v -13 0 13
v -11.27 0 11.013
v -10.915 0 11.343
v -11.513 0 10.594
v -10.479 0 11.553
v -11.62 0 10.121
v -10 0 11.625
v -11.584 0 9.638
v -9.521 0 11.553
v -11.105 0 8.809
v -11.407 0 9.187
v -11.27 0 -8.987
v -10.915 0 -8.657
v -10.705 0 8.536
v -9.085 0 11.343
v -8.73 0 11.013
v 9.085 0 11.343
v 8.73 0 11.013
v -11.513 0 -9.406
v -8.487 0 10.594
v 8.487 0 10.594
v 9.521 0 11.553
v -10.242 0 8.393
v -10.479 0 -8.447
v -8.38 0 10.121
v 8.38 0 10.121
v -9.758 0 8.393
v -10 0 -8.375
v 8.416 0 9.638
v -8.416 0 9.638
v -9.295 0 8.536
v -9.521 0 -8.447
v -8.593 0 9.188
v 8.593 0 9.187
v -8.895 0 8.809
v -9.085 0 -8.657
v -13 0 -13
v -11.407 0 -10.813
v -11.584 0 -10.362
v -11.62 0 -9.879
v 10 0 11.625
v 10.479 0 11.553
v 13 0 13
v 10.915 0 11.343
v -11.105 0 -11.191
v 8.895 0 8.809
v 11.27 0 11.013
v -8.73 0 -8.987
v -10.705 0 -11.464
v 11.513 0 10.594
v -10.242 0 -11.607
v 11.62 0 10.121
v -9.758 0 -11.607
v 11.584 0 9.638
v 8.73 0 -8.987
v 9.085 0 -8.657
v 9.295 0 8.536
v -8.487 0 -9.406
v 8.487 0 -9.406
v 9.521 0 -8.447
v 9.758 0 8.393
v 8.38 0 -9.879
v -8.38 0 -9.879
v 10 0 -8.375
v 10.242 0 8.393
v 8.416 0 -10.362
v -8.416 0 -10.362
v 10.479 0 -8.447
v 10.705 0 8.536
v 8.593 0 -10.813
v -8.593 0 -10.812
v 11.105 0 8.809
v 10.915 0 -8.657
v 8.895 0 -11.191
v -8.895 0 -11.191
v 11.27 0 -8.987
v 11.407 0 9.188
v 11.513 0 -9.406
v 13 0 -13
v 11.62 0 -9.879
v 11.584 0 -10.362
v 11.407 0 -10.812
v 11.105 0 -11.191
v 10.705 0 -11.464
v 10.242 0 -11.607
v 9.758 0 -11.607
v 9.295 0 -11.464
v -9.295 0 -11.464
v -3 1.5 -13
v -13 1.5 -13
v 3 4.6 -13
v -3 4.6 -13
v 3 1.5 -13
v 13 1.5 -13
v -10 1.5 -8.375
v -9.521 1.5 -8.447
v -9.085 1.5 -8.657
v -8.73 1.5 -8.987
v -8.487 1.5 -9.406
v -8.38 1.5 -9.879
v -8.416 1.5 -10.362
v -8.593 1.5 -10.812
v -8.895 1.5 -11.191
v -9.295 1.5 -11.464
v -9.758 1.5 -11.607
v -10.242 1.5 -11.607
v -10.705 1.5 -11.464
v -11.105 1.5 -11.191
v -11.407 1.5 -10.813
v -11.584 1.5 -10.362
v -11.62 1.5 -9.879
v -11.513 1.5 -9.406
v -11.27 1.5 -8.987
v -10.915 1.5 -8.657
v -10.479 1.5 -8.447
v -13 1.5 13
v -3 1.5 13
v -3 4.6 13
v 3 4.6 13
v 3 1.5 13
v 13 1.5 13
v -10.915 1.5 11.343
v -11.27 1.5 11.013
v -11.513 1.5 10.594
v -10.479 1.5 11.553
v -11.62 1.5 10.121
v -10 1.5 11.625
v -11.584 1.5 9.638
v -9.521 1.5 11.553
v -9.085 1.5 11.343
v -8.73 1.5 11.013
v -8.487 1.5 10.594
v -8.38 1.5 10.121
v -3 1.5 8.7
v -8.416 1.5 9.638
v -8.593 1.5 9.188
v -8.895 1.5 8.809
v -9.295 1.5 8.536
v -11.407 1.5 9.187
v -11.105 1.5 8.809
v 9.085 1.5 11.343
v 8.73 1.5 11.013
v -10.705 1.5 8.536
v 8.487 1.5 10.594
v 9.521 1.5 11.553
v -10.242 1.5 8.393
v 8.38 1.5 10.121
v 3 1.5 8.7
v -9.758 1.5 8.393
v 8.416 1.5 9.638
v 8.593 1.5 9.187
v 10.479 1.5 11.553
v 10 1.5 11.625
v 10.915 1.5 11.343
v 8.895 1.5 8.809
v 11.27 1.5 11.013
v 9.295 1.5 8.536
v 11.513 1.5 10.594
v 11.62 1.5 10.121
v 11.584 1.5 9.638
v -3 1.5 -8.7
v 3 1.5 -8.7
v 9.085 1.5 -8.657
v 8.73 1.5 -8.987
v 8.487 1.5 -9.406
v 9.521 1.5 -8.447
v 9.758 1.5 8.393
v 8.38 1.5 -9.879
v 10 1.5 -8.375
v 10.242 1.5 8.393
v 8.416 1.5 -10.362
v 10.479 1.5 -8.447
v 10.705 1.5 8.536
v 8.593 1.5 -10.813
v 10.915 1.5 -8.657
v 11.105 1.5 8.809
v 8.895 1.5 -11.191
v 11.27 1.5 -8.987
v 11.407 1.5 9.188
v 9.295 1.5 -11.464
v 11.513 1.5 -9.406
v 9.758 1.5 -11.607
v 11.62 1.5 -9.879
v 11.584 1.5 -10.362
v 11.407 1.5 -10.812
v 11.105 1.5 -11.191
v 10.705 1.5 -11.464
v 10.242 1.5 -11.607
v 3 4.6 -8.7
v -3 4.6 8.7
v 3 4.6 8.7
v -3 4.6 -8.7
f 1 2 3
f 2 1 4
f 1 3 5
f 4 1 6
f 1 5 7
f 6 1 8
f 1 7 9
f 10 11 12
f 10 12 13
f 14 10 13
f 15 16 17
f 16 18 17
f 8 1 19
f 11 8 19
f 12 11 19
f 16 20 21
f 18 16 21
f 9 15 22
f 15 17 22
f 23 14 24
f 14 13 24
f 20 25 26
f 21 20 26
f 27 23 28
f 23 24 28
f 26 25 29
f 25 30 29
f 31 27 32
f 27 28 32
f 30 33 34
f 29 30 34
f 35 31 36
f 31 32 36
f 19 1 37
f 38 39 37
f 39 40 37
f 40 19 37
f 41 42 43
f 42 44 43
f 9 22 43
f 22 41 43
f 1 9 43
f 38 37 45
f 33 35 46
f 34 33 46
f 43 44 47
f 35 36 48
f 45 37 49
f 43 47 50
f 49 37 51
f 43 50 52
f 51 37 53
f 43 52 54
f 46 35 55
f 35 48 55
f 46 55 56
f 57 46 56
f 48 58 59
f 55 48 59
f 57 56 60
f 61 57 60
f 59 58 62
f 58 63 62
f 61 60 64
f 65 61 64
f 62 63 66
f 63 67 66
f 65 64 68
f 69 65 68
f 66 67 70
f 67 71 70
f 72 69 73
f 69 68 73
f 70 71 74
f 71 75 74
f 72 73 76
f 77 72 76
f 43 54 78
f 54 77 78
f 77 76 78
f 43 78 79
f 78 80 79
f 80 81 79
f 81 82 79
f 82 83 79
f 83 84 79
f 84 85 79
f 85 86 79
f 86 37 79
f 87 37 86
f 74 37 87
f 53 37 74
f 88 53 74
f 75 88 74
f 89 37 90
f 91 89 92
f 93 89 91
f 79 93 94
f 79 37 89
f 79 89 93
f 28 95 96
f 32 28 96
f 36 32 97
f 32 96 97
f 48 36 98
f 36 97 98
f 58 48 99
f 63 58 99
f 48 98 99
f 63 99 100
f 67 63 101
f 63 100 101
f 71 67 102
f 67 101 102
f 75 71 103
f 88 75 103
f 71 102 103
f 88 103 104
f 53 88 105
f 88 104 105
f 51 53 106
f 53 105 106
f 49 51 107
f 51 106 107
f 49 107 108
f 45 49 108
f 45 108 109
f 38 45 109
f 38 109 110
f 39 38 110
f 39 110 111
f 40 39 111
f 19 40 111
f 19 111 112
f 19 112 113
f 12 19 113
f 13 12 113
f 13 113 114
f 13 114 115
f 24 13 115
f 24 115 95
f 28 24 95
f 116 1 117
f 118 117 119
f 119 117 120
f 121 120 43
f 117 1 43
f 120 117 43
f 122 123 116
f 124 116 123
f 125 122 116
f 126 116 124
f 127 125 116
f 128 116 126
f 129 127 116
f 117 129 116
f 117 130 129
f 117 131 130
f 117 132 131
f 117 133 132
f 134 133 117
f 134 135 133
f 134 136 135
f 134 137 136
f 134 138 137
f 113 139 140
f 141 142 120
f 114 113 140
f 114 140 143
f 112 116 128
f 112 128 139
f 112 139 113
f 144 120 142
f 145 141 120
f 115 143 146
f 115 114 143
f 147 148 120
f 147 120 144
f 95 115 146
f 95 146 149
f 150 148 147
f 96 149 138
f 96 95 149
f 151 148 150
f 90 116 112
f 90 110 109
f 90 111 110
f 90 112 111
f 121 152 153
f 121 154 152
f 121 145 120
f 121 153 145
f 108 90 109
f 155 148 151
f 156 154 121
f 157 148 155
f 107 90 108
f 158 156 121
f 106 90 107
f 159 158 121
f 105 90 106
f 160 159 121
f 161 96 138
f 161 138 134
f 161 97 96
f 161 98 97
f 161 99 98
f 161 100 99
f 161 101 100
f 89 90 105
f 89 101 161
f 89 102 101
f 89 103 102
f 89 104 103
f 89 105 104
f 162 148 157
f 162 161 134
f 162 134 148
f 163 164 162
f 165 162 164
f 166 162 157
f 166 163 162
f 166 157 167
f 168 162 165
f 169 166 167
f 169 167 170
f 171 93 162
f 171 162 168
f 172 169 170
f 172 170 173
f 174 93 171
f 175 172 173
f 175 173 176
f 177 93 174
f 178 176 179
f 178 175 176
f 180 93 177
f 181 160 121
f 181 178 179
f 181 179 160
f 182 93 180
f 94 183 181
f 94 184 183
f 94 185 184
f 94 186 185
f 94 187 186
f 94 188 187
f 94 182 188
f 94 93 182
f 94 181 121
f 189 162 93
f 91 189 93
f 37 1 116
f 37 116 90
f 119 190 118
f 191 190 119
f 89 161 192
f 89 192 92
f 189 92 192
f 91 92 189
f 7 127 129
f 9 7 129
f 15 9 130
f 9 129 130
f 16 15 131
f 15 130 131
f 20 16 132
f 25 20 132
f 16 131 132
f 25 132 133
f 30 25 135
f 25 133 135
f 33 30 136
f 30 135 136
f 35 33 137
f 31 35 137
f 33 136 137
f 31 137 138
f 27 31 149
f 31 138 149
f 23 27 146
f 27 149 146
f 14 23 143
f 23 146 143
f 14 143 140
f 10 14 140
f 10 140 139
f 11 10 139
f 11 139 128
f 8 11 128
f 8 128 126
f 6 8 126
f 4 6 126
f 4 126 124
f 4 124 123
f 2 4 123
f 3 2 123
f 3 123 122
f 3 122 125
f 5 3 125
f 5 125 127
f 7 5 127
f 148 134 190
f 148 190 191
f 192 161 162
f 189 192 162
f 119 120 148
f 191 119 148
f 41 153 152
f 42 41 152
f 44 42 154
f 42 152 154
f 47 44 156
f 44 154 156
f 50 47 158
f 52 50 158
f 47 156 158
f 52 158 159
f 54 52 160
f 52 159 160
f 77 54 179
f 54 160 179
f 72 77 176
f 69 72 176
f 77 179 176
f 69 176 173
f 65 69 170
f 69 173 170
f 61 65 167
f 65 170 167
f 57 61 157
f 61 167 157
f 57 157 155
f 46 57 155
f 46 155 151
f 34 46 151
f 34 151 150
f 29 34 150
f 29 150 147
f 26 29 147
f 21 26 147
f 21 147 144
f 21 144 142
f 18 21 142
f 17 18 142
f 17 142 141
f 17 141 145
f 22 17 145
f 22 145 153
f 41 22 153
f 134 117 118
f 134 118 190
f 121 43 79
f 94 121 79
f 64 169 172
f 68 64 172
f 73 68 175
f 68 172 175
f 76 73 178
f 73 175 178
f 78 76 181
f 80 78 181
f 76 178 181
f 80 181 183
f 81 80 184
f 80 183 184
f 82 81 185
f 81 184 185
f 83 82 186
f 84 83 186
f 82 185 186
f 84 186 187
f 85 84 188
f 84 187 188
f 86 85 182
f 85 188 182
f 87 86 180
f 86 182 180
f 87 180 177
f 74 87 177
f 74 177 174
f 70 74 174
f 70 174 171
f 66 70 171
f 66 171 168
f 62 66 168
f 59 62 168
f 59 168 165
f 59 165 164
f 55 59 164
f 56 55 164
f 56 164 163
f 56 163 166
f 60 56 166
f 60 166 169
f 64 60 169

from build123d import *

# Parameters (mm, degrees)
SKETCH1_W           = 26
SKETCH1_H           = 26
BOSS_EXTRUDE1_DEPTH = 1.5
SKETCH2_R           = 1.625
CUT_EXTRUDE1_DEPTH  = 19.445866746
SKETCH3_W           = 6
SKETCH3_H           = 4.3
BOSS_EXTRUDE2_DEPTH = 3.1


with BuildPart() as part:
    # Sketch1 → Boss-Extrude1 (new body)
    with BuildSketch(Plane(origin=(0, 0, 0), x_dir=(1, 0, 0), z_dir=(0, 1, 0))):
        Rectangle(SKETCH1_W, SKETCH1_H)
    extrude(amount=BOSS_EXTRUDE1_DEPTH)

    # Sketch2 → Cut-Extrude1 (cut, through all)
    with BuildSketch(Plane(origin=(0, 1.5, 0), x_dir=(1, 0, 0), z_dir=(0, 1, 0))):
        with Locations(Location((-10, 10, 0), (0, 0, 270))):
            Circle(SKETCH2_R)
        with Locations(Location((10, 10, 0), (0, 0, 270))):
            Circle(SKETCH2_R)
        with Locations(Location((10, -10, 0), (0, 0, 270))):
            Circle(SKETCH2_R)
        with Locations(Location((-10, -10, 0), (0, 0, 270))):
            Circle(SKETCH2_R)
    extrude(amount=-CUT_EXTRUDE1_DEPTH, mode=Mode.SUBTRACT)

    # Sketch3 → Boss-Extrude2 (add)
    with BuildSketch(Plane(origin=(0, 1.5, 0), x_dir=(1, 0, 0), z_dir=(0, 1, 0))):
        with Locations((0, 10.85)):
            Rectangle(SKETCH3_W, SKETCH3_H)
        with Locations((0, -10.85)):
            Rectangle(SKETCH3_W, SKETCH3_H)
    extrude(amount=BOSS_EXTRUDE2_DEPTH)


solid = part.part
